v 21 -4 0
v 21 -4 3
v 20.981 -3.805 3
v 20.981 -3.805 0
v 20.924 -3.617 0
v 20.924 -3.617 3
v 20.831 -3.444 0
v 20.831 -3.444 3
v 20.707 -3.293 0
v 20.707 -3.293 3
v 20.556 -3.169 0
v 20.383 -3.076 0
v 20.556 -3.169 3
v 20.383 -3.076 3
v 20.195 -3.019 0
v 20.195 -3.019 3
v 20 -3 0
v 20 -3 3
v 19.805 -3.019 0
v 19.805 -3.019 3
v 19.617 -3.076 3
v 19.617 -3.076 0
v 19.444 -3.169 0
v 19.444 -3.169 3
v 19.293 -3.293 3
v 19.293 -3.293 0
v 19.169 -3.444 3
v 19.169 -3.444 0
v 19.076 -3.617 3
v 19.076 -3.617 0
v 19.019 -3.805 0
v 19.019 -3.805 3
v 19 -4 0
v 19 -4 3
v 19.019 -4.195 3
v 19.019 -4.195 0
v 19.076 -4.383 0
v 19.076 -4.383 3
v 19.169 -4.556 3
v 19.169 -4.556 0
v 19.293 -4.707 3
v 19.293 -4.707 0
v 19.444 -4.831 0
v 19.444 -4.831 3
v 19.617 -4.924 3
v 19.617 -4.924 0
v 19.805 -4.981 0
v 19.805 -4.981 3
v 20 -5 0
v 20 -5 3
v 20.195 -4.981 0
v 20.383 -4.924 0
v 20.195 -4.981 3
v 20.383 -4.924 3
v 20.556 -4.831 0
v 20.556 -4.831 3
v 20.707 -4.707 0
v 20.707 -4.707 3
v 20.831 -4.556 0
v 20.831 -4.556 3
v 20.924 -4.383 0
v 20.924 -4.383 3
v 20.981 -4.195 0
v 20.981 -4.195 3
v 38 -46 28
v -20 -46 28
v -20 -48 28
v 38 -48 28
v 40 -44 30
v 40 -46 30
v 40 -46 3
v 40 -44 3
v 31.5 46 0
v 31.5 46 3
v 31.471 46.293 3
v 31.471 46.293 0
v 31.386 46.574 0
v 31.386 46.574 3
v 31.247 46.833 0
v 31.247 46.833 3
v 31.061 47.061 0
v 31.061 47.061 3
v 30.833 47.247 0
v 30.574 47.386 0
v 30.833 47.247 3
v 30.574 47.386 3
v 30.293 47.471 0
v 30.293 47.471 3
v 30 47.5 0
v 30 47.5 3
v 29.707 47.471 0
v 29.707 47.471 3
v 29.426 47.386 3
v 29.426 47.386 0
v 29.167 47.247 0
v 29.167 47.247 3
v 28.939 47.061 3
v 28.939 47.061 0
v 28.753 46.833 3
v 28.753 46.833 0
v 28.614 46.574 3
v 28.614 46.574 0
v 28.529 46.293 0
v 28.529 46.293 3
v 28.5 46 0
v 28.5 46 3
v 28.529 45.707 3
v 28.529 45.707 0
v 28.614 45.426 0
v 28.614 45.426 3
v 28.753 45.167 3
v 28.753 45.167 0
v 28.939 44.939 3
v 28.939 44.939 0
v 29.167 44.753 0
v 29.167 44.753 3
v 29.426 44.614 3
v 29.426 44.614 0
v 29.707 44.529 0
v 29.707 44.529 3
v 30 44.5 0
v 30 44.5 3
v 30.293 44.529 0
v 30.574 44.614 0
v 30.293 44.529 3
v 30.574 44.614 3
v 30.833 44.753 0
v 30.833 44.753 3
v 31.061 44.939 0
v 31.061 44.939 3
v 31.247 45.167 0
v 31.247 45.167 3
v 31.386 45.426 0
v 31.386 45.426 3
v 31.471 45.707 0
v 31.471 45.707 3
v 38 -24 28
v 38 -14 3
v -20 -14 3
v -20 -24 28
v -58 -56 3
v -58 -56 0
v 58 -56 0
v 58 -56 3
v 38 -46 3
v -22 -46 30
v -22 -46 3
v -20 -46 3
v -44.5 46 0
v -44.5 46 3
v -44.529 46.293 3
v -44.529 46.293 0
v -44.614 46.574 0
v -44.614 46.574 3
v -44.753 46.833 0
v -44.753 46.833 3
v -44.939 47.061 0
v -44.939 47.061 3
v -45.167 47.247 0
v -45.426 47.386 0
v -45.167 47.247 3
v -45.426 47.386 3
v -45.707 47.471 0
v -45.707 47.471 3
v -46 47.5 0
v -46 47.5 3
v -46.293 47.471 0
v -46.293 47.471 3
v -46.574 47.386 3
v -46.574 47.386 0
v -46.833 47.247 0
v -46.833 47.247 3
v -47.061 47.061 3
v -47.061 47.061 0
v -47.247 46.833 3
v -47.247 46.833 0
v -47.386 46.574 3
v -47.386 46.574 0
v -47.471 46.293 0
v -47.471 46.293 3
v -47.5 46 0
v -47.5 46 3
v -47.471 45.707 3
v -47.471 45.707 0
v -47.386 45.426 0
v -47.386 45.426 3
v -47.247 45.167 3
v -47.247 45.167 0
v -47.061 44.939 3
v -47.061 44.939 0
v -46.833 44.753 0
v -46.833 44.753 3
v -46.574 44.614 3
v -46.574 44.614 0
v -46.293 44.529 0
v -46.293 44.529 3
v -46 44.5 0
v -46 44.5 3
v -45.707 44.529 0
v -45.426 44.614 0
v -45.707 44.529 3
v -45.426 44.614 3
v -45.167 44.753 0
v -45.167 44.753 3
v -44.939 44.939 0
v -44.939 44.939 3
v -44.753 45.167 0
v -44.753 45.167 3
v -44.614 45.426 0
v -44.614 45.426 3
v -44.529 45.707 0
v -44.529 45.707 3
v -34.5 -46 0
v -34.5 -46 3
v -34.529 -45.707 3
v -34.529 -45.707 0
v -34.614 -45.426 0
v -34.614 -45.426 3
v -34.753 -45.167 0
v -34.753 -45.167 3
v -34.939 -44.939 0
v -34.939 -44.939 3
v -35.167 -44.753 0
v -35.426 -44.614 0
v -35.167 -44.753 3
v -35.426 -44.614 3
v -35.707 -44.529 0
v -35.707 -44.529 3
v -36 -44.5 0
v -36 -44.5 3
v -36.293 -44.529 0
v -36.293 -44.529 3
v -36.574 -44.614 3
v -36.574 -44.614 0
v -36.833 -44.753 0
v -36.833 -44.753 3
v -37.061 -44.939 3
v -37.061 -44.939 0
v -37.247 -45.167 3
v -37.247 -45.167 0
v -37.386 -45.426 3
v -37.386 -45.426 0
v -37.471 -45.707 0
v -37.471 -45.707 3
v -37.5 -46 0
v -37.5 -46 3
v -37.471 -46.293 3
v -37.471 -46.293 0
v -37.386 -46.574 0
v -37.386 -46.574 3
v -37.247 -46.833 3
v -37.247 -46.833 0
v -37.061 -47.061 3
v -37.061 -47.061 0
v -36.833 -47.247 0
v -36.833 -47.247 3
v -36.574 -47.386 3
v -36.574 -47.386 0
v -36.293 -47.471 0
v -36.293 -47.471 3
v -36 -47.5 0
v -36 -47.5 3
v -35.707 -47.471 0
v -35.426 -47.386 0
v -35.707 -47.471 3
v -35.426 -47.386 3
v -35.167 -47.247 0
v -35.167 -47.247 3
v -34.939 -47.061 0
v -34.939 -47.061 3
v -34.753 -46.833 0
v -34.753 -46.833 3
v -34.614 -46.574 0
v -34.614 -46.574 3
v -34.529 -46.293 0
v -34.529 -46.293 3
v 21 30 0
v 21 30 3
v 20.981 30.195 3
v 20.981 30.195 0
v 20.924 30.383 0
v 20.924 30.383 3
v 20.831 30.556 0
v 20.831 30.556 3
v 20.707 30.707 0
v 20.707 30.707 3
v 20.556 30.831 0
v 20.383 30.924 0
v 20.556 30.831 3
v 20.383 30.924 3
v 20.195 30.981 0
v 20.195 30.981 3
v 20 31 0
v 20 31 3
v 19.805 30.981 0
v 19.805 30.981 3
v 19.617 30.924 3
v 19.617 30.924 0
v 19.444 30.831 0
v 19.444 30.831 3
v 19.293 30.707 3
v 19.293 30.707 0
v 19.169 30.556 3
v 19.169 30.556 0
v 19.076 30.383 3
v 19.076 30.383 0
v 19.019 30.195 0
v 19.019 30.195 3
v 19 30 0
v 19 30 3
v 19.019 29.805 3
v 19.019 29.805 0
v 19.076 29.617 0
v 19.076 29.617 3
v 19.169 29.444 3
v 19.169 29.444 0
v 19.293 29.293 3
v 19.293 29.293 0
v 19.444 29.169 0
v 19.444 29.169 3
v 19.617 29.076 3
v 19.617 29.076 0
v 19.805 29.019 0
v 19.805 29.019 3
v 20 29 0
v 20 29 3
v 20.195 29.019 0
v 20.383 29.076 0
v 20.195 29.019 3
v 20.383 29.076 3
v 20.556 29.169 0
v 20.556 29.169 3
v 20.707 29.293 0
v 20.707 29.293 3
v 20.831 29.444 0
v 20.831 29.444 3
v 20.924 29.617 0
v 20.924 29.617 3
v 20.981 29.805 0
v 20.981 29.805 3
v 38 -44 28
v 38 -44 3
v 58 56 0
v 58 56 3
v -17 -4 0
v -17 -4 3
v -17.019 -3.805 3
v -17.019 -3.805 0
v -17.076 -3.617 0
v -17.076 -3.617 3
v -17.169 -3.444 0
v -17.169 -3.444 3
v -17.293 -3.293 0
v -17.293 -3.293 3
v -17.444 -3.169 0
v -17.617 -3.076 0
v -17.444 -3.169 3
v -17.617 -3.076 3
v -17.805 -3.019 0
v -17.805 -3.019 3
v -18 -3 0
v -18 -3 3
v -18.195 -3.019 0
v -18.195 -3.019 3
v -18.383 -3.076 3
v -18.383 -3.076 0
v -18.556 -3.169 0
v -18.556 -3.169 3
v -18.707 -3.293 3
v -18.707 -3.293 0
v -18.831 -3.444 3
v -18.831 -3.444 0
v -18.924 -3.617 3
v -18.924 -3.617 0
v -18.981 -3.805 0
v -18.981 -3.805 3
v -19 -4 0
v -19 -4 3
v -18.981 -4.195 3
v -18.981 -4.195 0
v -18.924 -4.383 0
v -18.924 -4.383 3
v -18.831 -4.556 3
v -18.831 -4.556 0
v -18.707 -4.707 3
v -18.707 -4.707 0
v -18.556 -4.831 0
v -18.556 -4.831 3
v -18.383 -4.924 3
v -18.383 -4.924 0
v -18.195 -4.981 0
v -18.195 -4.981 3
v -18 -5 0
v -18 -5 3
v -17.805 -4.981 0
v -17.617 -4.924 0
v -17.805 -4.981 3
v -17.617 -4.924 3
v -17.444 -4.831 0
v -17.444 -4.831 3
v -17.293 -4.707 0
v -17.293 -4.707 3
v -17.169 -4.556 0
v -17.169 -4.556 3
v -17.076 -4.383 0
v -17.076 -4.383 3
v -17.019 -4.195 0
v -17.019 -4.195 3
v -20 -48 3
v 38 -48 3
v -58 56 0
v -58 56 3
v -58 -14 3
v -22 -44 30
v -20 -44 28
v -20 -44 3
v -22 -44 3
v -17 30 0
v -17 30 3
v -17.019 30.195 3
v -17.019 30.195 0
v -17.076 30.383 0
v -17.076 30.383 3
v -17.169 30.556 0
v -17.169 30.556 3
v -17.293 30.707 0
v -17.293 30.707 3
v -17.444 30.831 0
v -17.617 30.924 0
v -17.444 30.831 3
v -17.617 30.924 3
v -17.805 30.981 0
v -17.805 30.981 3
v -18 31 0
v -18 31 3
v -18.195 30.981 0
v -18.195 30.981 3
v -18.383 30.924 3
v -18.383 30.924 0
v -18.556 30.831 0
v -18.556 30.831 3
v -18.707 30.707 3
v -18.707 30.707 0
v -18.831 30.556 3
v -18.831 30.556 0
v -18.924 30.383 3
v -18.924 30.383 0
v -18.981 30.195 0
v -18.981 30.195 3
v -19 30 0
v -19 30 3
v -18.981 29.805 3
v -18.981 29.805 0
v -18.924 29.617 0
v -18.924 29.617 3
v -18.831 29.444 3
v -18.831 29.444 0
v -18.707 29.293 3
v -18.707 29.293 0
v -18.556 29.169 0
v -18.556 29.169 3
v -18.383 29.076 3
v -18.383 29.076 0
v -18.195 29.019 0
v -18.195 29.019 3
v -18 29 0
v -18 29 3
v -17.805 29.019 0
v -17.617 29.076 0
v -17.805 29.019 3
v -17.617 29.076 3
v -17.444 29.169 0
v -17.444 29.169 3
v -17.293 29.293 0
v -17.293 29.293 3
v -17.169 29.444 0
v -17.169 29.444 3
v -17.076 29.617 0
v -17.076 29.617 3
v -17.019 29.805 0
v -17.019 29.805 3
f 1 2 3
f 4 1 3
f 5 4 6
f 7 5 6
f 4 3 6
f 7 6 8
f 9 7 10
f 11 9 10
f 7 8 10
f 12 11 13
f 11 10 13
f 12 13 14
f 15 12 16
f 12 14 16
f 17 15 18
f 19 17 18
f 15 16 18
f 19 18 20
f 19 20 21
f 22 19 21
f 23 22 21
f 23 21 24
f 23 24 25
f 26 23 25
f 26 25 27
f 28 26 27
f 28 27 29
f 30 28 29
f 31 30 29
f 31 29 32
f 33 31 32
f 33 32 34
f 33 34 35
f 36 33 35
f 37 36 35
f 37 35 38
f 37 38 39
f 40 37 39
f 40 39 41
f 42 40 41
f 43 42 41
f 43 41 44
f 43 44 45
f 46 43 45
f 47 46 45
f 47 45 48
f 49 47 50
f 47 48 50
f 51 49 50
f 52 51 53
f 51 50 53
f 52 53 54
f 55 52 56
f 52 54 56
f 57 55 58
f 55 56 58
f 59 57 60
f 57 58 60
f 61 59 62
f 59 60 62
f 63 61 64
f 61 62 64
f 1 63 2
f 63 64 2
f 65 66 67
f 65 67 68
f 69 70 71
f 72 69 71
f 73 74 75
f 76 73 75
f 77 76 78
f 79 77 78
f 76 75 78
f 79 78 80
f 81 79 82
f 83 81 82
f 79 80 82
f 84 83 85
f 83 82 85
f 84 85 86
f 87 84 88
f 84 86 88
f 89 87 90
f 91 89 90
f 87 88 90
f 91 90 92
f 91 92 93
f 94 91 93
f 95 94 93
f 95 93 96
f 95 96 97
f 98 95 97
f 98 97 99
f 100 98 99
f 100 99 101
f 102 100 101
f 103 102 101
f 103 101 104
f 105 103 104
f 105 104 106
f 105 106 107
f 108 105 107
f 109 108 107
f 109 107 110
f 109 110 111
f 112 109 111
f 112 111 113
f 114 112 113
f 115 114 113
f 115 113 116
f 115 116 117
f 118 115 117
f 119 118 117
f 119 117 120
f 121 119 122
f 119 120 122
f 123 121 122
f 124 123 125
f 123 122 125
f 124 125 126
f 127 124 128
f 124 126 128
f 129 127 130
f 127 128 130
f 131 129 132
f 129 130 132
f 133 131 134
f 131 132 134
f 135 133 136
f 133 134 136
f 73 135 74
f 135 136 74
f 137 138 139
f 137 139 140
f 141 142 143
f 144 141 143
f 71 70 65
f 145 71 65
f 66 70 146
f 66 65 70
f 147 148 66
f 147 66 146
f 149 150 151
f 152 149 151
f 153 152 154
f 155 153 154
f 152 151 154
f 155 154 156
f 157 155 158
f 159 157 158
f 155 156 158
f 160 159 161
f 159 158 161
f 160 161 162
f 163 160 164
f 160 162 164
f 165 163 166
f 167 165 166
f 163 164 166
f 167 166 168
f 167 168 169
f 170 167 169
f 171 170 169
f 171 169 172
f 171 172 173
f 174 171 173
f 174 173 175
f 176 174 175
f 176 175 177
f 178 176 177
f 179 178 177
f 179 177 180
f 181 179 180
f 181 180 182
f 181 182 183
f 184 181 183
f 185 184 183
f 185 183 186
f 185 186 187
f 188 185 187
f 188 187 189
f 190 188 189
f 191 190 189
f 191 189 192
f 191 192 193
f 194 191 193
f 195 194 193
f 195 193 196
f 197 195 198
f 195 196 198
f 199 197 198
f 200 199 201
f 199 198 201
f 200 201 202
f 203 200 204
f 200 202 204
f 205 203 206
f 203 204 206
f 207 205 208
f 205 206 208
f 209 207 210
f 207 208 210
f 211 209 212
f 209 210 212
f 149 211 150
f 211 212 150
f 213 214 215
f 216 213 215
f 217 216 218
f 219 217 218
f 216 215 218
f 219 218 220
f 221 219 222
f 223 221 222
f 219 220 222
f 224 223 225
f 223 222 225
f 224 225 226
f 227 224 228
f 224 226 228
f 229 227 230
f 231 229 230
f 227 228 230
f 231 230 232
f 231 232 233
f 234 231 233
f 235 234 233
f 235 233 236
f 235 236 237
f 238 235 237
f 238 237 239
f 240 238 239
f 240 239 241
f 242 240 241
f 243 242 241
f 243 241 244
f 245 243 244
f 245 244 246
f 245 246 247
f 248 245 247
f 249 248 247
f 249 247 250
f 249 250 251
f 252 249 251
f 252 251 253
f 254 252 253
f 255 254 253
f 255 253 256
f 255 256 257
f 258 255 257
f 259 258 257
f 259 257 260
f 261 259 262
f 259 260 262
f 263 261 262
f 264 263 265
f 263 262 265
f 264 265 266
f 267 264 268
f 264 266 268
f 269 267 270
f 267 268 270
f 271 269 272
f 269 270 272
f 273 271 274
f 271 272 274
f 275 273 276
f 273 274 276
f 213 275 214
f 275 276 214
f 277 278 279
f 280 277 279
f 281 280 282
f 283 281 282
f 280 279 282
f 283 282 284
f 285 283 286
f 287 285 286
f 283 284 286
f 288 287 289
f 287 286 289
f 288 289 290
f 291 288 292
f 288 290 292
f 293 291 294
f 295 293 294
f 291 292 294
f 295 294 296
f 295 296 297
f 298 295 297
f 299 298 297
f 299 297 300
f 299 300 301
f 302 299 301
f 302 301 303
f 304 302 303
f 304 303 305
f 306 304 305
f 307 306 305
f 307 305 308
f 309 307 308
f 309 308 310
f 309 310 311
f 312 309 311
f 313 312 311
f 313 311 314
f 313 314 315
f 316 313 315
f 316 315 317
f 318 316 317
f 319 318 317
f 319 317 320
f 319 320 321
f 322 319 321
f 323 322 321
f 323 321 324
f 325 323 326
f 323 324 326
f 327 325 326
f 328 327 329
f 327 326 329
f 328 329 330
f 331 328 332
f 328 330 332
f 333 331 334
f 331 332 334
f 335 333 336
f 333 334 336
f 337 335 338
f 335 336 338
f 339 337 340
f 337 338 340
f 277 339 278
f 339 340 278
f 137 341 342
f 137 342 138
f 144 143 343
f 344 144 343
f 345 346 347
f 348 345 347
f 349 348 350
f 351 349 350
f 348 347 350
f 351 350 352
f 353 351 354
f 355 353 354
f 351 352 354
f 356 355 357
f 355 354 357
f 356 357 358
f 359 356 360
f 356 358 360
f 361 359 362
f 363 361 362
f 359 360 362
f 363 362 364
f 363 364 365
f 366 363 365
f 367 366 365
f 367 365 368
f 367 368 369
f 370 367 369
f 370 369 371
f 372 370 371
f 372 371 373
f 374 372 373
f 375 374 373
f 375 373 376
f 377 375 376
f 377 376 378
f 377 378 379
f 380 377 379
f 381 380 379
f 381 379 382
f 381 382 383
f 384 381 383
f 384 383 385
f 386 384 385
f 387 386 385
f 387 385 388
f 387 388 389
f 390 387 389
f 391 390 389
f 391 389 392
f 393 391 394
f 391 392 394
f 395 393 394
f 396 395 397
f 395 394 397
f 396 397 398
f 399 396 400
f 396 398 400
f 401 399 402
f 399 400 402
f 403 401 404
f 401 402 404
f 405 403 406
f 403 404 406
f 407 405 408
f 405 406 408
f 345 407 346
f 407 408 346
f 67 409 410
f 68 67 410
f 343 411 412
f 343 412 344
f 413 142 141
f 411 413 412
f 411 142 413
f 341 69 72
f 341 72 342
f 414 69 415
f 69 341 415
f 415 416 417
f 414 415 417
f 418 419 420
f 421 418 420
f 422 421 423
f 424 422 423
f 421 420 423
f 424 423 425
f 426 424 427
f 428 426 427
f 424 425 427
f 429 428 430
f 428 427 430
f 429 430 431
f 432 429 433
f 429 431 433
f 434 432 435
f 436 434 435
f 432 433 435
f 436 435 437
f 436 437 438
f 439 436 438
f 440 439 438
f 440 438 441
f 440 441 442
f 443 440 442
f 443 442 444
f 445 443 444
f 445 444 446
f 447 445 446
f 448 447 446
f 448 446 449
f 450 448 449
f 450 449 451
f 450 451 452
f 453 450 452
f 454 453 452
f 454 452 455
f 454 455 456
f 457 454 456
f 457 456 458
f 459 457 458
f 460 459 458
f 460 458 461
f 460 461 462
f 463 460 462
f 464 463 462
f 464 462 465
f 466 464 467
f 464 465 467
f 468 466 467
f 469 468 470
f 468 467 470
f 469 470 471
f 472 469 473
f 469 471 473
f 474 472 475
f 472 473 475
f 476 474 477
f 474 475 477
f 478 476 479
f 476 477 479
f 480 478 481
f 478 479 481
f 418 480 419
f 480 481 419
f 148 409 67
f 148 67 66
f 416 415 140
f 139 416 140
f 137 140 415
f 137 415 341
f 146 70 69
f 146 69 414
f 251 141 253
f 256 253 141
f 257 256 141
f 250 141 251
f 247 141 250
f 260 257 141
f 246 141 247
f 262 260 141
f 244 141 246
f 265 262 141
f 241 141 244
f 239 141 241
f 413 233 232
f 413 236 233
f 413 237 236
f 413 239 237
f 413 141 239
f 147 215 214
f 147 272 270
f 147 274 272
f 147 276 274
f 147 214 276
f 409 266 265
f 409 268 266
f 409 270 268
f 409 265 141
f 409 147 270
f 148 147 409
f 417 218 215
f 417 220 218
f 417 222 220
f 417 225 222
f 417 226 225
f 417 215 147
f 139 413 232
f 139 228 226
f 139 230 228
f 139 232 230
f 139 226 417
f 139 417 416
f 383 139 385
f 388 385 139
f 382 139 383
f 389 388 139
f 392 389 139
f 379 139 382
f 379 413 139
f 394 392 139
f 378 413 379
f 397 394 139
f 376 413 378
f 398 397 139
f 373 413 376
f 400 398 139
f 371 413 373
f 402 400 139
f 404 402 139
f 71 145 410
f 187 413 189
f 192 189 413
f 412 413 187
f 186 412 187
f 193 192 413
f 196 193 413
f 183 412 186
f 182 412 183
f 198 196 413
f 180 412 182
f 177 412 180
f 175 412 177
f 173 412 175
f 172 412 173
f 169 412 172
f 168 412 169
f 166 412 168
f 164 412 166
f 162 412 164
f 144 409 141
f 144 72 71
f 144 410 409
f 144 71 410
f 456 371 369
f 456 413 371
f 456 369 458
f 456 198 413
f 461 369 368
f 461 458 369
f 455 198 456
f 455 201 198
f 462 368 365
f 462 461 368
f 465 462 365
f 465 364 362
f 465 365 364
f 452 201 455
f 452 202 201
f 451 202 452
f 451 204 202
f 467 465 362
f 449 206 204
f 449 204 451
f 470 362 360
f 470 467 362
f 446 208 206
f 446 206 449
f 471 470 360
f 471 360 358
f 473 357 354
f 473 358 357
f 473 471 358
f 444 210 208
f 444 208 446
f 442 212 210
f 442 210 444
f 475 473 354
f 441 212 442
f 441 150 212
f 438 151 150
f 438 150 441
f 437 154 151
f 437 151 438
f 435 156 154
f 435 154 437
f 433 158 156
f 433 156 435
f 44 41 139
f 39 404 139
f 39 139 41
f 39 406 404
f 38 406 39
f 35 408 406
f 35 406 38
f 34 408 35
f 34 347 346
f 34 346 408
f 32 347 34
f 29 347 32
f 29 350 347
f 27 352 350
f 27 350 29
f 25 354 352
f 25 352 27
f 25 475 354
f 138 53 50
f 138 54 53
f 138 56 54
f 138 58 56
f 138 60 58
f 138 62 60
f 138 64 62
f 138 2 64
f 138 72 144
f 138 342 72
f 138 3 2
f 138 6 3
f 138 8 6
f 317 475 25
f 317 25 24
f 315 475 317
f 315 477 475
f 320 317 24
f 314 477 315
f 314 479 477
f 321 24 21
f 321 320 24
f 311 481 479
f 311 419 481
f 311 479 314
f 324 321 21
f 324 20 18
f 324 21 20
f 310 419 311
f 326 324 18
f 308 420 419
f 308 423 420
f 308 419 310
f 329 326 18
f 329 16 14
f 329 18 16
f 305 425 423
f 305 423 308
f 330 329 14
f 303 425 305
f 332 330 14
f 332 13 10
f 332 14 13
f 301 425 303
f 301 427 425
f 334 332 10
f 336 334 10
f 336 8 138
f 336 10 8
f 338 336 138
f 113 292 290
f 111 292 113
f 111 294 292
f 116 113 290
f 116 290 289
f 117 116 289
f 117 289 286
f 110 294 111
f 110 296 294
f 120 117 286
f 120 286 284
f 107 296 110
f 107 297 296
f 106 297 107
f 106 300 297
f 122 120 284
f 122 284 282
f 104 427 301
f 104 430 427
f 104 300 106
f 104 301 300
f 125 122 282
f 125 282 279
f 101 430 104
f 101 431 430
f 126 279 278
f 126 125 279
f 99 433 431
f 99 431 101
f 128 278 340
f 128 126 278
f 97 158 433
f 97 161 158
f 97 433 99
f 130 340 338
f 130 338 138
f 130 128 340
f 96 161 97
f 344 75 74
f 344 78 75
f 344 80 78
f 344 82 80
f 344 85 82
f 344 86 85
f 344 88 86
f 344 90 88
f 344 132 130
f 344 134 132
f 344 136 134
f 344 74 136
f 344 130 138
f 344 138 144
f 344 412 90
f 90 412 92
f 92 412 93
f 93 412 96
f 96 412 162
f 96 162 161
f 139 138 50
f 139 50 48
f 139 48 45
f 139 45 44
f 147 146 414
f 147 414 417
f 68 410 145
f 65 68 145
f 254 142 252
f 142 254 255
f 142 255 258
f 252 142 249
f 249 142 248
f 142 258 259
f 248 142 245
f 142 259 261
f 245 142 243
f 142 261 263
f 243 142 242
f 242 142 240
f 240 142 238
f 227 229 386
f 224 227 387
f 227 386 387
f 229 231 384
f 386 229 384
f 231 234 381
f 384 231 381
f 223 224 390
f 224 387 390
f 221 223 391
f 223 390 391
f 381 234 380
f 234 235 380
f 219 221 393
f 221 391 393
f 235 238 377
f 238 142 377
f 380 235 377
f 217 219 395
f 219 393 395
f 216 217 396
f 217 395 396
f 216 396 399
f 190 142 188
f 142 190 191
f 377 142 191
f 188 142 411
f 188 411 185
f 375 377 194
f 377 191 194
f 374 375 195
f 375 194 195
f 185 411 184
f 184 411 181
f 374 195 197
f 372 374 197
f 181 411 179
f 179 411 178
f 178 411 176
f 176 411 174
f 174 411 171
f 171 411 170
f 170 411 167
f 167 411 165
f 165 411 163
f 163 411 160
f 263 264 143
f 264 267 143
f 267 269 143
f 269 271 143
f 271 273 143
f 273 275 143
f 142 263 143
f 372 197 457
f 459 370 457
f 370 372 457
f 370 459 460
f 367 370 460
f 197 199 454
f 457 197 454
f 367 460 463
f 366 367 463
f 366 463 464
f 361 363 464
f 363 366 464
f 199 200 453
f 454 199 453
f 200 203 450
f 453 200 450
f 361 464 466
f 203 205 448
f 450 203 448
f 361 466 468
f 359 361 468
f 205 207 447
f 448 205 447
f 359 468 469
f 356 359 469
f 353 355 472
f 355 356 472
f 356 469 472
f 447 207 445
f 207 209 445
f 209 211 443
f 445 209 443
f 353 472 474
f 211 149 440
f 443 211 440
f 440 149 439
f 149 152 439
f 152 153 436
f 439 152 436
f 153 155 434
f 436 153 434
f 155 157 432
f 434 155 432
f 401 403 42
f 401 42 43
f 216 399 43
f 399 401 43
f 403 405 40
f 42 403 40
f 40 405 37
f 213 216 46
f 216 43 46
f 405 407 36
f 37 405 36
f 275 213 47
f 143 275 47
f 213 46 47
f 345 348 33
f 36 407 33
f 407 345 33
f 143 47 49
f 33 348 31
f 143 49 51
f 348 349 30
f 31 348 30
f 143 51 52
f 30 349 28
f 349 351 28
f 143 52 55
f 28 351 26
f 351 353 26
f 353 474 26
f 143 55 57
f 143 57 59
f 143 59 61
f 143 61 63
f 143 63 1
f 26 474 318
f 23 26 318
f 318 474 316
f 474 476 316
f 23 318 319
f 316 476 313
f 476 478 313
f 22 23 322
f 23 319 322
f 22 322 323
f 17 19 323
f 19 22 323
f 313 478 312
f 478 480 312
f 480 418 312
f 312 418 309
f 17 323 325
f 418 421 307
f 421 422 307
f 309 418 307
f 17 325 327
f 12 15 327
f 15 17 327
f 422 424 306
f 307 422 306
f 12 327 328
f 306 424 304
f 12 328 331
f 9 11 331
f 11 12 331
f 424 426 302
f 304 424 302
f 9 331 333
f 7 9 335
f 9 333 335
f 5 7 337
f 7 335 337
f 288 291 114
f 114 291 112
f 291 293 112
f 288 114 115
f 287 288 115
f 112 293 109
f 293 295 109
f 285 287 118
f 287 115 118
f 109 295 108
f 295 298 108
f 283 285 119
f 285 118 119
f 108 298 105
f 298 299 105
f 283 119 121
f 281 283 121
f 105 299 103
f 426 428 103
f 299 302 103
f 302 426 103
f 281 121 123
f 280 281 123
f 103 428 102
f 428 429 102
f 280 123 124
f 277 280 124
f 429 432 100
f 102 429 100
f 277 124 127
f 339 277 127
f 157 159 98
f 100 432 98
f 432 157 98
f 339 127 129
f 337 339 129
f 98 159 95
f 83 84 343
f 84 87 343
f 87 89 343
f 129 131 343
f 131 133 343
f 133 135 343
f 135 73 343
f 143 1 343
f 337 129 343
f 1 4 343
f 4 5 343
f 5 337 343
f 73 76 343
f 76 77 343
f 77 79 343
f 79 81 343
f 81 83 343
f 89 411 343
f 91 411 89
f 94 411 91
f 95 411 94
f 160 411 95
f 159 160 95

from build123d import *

# Parameters (mm, degrees)
CROQUIS1_W              = 116
CROQUIS1_H              = 112
SALIENTE_EXTRUIR1_DEPTH = 3
CROQUIS2_W              = 58
CROQUIS2_H              = 34
SALIENTE_EXTRUIR2_DEPTH = 25
CROQUIS3_W              = 62
CROQUIS3_H              = 27
SALIENTE_EXTRUIR3_DEPTH = 2
CORTAR_EXTRUIR1_DEPTH   = 116.117331449
CROQUIS5_R              = 1.5
CROQUIS5_R_2            = 1
CORTAR_EXTRUIR2_DEPTH   = 86.023526156


with BuildPart() as part:
    # Croquis1 → Saliente-Extruir1 (new body)
    with BuildSketch(Plane.XY):
        Rectangle(CROQUIS1_W, CROQUIS1_H)
    extrude(amount=SALIENTE_EXTRUIR1_DEPTH)

    # Croquis2 → Saliente-Extruir2 (add)
    with BuildSketch(Plane.XY.offset(3)):
        with Locations((9, -31)):
            Rectangle(CROQUIS2_W, CROQUIS2_H)
    extrude(amount=SALIENTE_EXTRUIR2_DEPTH)

    # Croquis3 → Saliente-Extruir3 (add)
    with BuildSketch(Plane(origin=(0, -46, 0), x_dir=(-1, 0, 0), z_dir=(0, -1, 0))):
        with Locations((-9, -16.5)):
            Rectangle(CROQUIS3_W, CROQUIS3_H)
    extrude(amount=-SALIENTE_EXTRUIR3_DEPTH)

    # Croquis4 → Cortar-Extruir1 (cut, through all)
    with BuildSketch(Plane(origin=(38, 0, 0), x_dir=(0, 0, -1), z_dir=(1, 0, 0))):
        Polygon((-3, -14), (-28, -24.000473789), (-28, -14), align=None)
    extrude(amount=-CORTAR_EXTRUIR1_DEPTH, mode=Mode.SUBTRACT)

    # Croquis5 → Cortar-Extruir2 (cut, through all)
    with BuildSketch(Plane.XY.offset(3)):
        with Locations((-36, -46)):
            Circle(CROQUIS5_R)
        with Locations((-46, 46)):
            Circle(CROQUIS5_R)
        with Locations((30, 46)):
            Circle(CROQUIS5_R)
        with Locations((20, 30)):
            Circle(CROQUIS5_R_2)
        with Locations((20, -4)):
            Circle(CROQUIS5_R_2)
        with Locations((-18, -4)):
            Circle(CROQUIS5_R_2)
        with Locations((-18, 30)):
            Circle(CROQUIS5_R_2)
    extrude(amount=-CORTAR_EXTRUIR2_DEPTH, mode=Mode.SUBTRACT)


solid = part.part
